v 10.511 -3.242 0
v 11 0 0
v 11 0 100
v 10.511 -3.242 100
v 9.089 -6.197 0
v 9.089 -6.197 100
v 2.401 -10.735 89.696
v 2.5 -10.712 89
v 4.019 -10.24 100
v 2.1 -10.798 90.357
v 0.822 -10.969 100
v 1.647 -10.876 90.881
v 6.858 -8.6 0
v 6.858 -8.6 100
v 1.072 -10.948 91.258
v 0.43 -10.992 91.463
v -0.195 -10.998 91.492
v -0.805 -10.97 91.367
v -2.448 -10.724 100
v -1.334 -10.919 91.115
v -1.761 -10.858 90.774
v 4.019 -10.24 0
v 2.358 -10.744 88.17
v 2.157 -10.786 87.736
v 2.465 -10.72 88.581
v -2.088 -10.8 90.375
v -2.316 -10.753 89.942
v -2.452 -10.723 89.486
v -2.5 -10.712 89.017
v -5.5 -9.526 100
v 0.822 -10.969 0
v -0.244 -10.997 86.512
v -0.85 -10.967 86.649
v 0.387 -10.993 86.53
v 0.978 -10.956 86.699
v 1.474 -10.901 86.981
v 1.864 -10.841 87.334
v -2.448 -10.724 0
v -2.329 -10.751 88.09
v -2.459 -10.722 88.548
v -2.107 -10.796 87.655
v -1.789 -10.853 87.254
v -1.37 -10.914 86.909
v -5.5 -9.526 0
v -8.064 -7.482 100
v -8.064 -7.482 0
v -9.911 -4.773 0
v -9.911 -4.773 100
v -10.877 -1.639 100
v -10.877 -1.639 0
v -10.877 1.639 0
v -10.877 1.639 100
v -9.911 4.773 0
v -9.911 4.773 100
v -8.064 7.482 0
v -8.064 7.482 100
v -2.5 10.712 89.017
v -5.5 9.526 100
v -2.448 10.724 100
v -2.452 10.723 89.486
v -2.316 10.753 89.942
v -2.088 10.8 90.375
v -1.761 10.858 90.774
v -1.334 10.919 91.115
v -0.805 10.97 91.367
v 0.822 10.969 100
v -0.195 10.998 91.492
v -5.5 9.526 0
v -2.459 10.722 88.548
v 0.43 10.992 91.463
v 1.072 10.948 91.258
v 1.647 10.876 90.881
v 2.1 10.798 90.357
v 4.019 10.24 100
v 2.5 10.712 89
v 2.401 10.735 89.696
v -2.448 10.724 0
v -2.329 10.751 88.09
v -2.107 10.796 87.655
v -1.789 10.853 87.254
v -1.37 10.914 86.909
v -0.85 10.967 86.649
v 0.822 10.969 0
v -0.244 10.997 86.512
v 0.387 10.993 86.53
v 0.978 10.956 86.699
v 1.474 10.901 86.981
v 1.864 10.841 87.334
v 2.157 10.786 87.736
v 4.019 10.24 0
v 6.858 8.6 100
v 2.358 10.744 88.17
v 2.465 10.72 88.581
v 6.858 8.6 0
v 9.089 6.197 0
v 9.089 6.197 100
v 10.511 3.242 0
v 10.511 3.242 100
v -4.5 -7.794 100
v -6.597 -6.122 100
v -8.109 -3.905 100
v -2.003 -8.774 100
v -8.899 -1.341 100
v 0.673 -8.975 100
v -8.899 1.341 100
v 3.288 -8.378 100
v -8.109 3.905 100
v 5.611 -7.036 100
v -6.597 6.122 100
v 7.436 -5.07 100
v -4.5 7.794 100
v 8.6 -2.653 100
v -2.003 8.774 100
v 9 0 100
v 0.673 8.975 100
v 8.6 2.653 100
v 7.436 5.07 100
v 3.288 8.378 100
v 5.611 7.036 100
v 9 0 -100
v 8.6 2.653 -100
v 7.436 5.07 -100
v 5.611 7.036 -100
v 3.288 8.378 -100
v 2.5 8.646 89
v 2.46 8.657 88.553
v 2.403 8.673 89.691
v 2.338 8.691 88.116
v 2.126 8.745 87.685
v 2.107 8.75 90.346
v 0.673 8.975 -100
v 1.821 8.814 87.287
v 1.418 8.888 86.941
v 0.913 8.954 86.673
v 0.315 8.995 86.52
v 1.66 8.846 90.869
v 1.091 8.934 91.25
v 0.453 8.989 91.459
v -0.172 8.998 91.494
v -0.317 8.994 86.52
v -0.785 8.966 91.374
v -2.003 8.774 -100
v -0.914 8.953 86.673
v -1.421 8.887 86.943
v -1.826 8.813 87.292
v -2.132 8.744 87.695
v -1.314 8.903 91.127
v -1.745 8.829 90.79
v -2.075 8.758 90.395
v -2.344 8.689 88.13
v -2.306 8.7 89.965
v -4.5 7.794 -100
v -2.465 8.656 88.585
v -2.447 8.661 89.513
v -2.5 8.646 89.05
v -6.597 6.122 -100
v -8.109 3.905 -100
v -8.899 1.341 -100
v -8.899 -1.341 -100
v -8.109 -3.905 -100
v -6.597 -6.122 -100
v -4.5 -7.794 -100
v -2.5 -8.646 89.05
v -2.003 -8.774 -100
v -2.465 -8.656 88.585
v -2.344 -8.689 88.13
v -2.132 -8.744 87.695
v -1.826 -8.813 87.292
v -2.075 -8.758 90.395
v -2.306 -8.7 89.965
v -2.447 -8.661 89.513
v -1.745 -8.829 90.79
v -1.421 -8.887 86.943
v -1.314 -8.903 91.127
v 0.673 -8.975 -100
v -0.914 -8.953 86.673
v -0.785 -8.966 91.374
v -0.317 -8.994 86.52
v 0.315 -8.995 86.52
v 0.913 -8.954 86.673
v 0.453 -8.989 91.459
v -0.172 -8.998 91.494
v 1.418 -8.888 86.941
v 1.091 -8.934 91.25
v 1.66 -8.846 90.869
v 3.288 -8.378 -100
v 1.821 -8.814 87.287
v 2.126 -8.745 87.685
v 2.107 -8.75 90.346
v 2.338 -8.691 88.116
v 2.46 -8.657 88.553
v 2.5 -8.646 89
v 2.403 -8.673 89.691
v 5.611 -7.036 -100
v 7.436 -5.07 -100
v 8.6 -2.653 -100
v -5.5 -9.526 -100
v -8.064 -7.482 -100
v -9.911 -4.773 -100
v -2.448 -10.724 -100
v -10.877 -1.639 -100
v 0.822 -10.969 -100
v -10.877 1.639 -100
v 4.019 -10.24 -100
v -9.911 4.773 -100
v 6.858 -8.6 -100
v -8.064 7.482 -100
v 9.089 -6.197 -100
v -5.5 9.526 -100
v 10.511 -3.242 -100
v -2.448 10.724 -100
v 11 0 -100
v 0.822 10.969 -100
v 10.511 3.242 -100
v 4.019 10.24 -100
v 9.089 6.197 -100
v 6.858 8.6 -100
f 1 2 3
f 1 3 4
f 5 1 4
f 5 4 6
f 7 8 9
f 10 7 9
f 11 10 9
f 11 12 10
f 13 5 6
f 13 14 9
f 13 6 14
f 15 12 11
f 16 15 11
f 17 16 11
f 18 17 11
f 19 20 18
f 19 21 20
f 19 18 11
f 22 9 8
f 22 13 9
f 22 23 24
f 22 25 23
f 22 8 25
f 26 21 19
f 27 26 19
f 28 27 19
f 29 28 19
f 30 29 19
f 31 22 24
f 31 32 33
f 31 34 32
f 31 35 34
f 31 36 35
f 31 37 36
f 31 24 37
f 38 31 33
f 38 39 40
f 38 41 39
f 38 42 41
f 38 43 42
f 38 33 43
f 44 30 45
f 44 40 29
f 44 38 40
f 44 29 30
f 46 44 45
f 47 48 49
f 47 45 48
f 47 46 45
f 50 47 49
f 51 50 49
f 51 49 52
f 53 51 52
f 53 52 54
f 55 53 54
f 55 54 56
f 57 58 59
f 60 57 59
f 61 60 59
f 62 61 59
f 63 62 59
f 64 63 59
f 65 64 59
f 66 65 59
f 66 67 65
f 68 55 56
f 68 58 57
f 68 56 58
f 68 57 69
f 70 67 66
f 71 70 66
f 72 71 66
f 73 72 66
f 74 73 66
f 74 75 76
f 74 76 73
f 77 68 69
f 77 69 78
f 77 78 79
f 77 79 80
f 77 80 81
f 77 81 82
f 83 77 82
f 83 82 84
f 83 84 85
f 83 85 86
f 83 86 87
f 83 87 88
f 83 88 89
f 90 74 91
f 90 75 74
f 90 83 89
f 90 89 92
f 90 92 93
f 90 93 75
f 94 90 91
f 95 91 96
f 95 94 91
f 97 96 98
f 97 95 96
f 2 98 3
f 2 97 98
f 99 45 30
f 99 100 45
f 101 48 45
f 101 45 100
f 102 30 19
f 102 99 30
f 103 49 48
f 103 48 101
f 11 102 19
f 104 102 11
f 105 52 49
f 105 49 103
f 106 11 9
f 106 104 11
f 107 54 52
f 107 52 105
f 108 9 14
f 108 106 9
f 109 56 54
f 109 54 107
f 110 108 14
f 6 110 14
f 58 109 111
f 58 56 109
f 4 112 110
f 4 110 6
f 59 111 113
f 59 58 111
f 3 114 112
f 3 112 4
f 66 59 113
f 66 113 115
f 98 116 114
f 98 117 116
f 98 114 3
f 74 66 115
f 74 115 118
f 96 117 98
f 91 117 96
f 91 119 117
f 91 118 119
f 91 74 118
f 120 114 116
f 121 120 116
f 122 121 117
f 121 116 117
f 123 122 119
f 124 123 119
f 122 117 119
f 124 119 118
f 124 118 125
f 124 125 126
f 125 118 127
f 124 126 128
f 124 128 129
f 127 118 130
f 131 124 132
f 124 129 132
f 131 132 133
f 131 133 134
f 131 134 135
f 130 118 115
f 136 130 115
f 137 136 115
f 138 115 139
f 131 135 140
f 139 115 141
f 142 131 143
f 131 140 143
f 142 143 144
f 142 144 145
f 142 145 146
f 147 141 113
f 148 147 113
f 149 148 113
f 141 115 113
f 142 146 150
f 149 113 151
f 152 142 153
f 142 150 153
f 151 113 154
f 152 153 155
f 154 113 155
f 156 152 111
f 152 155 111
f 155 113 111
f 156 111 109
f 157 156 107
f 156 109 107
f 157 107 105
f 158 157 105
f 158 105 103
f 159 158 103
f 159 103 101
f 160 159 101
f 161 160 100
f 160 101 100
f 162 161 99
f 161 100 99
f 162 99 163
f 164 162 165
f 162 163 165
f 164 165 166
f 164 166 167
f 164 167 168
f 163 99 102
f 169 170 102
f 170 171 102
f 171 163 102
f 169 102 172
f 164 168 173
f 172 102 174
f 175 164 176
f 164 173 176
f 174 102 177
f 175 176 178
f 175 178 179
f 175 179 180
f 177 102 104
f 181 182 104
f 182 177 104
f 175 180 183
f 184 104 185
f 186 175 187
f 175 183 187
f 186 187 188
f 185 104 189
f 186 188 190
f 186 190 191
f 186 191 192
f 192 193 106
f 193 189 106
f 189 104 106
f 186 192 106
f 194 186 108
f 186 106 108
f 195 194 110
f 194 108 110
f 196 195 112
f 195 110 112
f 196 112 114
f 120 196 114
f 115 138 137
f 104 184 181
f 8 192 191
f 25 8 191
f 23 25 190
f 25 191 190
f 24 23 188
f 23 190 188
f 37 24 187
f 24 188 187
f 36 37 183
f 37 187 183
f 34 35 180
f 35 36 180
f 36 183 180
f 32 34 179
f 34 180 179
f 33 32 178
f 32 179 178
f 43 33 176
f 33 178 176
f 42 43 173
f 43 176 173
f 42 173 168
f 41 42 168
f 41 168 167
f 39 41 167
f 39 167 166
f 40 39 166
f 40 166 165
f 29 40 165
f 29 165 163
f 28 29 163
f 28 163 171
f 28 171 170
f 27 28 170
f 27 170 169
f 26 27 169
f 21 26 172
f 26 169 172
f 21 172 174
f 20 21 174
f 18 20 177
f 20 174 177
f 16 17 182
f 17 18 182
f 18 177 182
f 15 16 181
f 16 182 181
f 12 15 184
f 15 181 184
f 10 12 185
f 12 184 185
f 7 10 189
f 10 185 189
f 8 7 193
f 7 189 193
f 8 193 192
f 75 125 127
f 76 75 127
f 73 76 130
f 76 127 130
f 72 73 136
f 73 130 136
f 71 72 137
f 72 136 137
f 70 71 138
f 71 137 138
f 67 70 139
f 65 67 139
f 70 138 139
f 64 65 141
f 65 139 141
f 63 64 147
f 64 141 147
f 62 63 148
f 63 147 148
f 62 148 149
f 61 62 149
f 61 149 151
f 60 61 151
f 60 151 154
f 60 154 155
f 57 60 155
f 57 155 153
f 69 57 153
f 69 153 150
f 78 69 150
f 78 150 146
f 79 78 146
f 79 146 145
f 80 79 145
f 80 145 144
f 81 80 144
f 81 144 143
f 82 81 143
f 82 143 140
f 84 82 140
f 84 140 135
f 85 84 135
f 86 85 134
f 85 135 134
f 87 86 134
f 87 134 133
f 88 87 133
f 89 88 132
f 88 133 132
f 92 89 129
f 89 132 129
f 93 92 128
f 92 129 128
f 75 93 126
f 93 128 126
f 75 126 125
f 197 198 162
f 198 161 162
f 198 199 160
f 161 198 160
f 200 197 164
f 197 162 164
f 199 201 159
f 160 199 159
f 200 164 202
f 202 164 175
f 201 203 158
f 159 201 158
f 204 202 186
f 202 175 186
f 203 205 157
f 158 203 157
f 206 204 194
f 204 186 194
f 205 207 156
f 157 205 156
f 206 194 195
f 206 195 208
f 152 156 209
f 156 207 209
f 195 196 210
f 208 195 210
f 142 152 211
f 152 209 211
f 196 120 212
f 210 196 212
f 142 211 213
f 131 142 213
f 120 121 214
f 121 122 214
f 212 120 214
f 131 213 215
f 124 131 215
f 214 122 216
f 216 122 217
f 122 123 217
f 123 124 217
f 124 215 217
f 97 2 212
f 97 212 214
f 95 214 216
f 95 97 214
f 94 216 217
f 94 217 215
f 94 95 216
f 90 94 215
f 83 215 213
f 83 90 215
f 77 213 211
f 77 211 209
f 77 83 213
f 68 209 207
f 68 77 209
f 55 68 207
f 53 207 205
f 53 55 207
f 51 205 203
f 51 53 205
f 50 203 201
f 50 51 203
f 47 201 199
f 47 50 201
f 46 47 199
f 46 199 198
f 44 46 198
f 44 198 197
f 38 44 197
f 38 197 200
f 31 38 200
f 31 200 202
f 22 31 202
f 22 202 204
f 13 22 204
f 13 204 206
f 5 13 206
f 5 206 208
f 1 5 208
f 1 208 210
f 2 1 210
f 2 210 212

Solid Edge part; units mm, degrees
sketch "Sketch1" plane through (0, 0, 0) normal (0, 0, 1) x (1, 0, 0)
  circle A0 centre (0, 0) radius 11
extrude "Protrusion1" add sketch "Sketch1" along normal mid plane 200
sketch "Sketch2" plane through (0, 0, 100) normal (0, 0, 1) x (1, 0, 0)
  circle A0 centre (0, 0) radius 9
extrude "Cutout1" cut sketch "Sketch2" against normal up to vertex (200 mm away)
sketch "Sketch3" plane through (0, 0, 0) normal (0, -1, 0) x (1, 0, 0)
  circle A0 centre (0, 89) radius 2.5
extrude "ExtrudedCutout_2" cut sketch "Sketch3" along normal mid plane 30
